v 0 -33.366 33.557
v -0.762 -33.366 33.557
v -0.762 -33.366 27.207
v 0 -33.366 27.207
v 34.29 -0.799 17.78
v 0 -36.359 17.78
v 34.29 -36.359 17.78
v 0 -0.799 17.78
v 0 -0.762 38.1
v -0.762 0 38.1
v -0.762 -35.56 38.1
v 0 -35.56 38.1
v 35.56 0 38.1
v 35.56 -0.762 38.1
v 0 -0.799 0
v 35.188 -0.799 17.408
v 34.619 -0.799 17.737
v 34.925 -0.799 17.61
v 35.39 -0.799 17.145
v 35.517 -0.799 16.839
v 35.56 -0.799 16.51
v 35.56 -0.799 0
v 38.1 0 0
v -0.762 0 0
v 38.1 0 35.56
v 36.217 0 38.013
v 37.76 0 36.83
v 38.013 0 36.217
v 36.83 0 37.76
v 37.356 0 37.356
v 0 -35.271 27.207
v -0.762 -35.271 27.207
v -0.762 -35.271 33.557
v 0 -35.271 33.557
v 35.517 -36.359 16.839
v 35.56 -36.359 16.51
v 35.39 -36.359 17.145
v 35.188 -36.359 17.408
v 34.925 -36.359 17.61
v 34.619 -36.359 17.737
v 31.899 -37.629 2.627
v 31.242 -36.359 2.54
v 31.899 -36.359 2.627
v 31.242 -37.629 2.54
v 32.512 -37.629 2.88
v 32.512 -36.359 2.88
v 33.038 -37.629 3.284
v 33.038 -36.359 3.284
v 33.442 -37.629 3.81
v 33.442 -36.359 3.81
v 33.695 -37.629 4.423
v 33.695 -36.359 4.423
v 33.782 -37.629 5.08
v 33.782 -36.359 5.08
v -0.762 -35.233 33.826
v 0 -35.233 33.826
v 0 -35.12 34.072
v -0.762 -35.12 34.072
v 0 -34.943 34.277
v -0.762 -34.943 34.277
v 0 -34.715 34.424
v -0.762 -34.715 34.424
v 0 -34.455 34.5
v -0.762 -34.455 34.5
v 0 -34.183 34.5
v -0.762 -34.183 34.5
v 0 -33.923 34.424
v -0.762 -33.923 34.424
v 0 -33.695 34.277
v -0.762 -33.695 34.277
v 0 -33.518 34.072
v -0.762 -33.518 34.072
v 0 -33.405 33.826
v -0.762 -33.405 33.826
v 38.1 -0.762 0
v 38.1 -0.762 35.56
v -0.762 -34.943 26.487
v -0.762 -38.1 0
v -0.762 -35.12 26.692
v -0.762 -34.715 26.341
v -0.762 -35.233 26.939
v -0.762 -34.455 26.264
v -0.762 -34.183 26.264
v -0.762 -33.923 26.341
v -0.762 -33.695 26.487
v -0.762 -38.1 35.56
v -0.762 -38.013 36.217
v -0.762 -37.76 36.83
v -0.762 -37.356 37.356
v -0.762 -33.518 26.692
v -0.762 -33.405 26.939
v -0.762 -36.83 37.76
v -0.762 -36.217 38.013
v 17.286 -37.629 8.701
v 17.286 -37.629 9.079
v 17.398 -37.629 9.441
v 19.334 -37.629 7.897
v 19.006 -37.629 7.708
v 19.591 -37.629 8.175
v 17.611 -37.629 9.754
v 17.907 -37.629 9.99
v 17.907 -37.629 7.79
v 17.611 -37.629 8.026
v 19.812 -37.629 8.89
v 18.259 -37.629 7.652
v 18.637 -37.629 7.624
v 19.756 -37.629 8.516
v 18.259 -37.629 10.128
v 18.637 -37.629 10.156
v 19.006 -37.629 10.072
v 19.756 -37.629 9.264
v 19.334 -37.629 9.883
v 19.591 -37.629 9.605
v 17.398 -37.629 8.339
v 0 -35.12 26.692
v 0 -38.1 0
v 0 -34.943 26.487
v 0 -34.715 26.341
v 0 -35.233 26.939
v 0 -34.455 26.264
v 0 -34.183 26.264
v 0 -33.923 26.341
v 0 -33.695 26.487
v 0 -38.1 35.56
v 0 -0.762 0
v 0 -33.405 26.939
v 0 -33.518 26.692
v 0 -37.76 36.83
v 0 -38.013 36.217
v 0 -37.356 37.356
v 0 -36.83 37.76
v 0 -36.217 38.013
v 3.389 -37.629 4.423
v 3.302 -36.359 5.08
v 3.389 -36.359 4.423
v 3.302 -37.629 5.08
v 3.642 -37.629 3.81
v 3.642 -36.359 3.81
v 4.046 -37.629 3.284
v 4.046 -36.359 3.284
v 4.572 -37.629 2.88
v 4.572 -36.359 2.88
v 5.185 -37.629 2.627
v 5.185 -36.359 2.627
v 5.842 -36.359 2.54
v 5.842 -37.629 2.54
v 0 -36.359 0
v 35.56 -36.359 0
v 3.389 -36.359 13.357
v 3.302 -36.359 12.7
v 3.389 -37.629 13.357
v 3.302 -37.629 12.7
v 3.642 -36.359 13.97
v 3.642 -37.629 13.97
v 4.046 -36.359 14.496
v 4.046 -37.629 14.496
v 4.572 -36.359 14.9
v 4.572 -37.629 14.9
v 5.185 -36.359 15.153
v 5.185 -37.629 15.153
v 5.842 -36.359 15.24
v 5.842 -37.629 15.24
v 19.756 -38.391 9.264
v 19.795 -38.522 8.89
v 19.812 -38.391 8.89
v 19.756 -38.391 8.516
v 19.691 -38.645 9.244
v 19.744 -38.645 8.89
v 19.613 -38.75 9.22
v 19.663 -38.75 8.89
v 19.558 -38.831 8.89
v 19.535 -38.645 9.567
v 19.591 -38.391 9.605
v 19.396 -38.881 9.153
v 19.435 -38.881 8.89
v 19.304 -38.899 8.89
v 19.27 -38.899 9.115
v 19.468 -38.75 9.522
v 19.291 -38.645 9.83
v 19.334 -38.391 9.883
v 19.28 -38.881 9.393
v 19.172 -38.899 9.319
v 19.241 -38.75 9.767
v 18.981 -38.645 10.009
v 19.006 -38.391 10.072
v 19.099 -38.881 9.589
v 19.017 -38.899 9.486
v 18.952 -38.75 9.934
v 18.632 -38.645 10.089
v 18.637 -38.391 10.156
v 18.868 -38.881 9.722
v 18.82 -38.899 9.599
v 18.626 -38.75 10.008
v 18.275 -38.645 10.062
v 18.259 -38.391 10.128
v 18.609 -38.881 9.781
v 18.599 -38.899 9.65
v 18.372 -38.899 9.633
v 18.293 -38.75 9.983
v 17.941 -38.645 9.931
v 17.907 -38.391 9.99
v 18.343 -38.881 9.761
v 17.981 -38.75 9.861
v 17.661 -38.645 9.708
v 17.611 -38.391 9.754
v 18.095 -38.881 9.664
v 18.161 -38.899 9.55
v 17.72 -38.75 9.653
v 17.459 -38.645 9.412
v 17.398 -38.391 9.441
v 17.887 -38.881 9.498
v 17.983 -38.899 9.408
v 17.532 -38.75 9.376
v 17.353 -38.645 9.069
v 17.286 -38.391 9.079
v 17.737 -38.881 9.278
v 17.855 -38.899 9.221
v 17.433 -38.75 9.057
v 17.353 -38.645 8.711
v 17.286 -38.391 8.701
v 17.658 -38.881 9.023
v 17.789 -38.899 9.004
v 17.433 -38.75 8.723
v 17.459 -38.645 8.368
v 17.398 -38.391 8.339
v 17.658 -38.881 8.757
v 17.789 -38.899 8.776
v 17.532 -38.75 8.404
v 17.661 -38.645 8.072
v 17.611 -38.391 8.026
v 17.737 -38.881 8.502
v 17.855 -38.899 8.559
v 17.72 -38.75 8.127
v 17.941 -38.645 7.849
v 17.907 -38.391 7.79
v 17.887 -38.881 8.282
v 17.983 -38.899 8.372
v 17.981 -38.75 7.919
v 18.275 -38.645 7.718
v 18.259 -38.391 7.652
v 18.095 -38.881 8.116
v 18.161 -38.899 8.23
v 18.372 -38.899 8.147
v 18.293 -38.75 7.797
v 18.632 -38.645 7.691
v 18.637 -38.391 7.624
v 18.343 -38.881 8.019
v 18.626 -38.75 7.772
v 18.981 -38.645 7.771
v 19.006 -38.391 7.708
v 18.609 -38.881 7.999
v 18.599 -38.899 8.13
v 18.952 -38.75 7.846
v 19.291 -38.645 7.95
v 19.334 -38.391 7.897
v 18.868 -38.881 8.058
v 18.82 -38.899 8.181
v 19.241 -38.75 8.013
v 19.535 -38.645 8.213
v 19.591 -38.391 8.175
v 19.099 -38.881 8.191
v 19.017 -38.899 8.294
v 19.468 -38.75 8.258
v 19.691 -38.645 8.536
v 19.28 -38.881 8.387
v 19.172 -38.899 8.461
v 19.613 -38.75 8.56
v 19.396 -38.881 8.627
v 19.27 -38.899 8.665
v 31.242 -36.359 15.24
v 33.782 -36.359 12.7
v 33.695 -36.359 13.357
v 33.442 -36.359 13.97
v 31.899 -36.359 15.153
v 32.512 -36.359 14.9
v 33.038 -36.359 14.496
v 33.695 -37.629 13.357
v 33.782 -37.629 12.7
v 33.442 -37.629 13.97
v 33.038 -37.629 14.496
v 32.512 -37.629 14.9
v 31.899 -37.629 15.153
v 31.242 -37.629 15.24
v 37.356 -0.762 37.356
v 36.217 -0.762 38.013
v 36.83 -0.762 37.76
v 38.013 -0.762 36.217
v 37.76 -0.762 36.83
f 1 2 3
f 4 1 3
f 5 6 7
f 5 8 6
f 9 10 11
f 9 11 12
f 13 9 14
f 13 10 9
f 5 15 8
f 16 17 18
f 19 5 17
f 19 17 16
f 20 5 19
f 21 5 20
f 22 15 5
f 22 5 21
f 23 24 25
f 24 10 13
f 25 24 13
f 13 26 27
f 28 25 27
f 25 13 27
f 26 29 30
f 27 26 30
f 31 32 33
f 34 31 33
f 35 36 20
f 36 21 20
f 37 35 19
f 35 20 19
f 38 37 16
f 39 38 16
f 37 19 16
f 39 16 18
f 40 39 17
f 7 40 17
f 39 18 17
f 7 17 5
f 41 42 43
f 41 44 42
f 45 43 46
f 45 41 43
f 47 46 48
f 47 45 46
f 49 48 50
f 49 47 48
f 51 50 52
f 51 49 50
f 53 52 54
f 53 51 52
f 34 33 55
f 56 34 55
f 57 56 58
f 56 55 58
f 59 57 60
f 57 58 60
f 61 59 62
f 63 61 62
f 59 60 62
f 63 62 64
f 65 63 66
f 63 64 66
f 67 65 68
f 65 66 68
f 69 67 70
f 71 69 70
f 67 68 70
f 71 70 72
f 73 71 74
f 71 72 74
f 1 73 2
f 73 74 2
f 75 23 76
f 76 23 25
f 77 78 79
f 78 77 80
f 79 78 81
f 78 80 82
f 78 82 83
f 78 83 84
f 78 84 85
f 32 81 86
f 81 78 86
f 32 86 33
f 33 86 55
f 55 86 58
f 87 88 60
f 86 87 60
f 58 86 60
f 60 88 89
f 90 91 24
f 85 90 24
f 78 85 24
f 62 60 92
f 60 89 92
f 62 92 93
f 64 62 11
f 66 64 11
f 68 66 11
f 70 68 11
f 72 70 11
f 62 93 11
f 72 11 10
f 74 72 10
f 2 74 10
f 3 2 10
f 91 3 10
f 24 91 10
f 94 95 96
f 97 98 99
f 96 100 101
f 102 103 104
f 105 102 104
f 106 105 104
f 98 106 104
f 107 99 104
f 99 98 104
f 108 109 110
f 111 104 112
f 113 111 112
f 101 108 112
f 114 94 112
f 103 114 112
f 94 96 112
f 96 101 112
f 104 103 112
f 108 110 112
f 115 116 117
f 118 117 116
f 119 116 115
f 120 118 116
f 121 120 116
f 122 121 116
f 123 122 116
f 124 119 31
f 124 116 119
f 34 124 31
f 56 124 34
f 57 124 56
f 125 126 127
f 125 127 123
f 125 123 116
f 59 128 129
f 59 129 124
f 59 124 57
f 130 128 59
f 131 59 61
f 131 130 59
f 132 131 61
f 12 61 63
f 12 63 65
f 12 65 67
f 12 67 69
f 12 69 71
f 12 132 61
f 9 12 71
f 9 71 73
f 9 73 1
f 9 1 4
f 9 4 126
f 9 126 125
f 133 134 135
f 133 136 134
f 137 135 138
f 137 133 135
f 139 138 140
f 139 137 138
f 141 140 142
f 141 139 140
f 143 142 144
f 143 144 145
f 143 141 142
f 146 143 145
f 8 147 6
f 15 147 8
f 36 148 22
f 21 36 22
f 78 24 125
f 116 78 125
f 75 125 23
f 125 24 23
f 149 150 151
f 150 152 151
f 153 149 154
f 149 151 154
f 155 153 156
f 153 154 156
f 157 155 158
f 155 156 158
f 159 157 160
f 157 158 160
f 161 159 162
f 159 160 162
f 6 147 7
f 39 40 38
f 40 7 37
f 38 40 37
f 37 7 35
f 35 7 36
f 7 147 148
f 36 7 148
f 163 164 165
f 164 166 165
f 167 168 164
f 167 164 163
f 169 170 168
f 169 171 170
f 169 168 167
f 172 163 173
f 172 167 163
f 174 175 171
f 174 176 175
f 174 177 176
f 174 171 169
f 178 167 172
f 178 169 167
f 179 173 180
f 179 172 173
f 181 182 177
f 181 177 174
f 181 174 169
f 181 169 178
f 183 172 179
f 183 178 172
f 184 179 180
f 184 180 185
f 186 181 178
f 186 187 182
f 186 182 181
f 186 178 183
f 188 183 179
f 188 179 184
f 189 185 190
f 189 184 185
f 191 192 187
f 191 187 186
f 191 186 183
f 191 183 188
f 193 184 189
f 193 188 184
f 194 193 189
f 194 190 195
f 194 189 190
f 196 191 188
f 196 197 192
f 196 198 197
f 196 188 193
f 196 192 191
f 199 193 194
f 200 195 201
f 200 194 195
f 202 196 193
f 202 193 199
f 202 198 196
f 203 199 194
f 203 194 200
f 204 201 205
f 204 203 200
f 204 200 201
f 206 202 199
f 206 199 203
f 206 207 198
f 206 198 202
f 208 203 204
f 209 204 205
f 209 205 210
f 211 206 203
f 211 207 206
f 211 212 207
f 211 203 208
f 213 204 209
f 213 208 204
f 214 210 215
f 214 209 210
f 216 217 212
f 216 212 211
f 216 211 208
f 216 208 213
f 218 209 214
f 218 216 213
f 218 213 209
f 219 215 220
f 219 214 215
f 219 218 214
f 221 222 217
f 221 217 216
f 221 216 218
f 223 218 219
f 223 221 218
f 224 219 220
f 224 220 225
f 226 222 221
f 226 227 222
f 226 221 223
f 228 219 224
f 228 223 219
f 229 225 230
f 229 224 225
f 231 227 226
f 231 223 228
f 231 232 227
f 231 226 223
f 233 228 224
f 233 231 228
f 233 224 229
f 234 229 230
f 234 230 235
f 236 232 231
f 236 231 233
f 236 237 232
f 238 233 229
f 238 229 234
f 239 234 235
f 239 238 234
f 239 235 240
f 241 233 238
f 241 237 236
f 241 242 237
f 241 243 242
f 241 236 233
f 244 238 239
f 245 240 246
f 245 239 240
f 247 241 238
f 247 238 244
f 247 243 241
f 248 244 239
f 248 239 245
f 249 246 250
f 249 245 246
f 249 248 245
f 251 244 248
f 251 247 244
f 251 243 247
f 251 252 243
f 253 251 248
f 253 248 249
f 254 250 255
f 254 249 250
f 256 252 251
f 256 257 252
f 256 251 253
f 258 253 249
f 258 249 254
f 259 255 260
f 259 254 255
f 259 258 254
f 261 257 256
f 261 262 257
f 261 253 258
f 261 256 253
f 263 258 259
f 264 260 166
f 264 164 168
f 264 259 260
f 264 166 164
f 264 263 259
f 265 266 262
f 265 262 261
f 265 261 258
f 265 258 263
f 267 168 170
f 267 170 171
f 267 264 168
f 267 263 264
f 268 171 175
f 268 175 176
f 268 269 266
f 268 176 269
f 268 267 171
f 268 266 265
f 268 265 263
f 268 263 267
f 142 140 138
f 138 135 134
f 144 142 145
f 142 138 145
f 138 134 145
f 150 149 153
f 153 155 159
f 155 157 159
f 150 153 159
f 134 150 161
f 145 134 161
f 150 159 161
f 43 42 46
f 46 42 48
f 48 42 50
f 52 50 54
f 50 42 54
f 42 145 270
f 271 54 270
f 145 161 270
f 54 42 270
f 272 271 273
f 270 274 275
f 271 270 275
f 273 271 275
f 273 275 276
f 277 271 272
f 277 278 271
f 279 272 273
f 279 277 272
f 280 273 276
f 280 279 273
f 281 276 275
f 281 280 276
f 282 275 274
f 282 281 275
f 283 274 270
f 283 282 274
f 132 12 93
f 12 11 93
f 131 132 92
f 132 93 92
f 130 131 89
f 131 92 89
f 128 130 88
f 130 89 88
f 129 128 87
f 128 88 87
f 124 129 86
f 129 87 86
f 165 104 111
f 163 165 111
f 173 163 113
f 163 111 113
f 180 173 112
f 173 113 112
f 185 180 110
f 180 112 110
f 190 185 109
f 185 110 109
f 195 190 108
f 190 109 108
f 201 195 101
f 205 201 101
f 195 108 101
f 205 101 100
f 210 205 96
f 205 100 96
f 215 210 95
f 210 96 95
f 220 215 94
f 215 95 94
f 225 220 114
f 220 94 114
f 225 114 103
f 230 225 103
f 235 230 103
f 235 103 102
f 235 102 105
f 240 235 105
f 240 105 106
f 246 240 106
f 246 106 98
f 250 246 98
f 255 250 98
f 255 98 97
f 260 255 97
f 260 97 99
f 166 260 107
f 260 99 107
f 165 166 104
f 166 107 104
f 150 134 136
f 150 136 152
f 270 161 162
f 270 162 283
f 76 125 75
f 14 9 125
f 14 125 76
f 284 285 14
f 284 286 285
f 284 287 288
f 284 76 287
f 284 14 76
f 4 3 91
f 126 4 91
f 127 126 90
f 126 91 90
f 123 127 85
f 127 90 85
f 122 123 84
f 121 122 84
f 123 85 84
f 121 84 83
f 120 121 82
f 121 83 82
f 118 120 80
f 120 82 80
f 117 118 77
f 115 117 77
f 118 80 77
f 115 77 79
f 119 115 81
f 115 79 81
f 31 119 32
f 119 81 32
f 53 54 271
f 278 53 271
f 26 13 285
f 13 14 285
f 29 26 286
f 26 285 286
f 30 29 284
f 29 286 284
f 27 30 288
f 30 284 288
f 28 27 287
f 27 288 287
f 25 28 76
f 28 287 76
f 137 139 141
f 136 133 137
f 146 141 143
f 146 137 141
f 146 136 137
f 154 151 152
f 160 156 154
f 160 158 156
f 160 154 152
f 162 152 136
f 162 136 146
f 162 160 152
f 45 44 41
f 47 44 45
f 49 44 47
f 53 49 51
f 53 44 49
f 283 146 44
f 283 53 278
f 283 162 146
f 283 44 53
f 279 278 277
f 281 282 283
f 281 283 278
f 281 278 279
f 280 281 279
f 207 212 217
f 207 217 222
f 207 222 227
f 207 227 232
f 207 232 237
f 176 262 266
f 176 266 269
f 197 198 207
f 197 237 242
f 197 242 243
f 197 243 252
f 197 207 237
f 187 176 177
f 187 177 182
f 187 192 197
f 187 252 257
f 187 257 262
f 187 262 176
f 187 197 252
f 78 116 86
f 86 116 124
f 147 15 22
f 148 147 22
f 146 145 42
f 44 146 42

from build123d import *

# Parameters (mm, degrees)
F0_W      = 38.1
F0_H      = 38.1
F2_DEPTH  = 0.762
F1_W      = 38.1
F1_H      = 38.1
F3_DEPTH  = 0.762
F4_W      = 35.56
F4_H      = 35.56
F5_DEPTH  = 17.78
F6_W      = 30.48
F6_H      = 12.7
F7_DEPTH  = 1.27
F8_R      = 1.27
F9_DEPTH  = 1.27
F10_R     = 2.54
F11_R     = 1.27
F13_DEPTH = 25.4
F14_R     = 0.508
F15_R     = 2.54
F16_R     = 2.54


with BuildPart() as f2:
    # F0 (on Right) → F2 (new body)
    with BuildSketch(Plane.YZ):
        with Locations((-19.05, 19.05)):
            Rectangle(F0_W, F0_H)
    extrude(amount=-F2_DEPTH)

    # F1 (on Front) → F3 (join)
    with BuildSketch(Plane.XZ):
        with Locations((19.05, 19.05)):
            Rectangle(F1_W, F1_H)
    extrude(amount=F3_DEPTH)

    # F10
    f10_edges = [f2.edges().sort_by_distance(p)[0] for p in [
        (-0.381, -38.1, 38.1),
    ]]
    fillet(f10_edges, radius=F10_R)

    # F12 (on face) → F13 (cut)
    with BuildSketch(Plane(origin=(-0.762, 0, 0), x_dir=(0, -1, 0), z_dir=(-1, 0, 0))):
        with BuildLine():
            ThreePointArc((35.2714537645, 33.5571871057), (34.3189537645, 34.5096871057), (33.3664537645, 33.5571871057))
            Line((33.3664537645, 33.5571871057), (33.3664537645, 27.2071871057))
            ThreePointArc((33.3664537645, 27.2071871057), (34.3189537645, 26.2546871057), (35.2714537645, 27.2071871057))
            Line((35.2714537645, 27.2071871057), (35.2714537645, 33.5571871057))
        make_face()
    extrude(amount=-F13_DEPTH, mode=Mode.SUBTRACT)

    # F16
    f16_edges = [f2.edges().sort_by_distance(p)[0] for p in [
        (38.1, -0.381, 38.1),
    ]]
    fillet(f16_edges, radius=F16_R)


with BuildPart() as f5:
    # F4 (on Top) → F5 (new body)
    with BuildSketch(Plane.XY):
        with Locations((17.78, -18.5785688174)):
            Rectangle(F4_W, F4_H)
    extrude(amount=F5_DEPTH)

    # F11
    f11_edges = [f5.edges().sort_by_distance(p)[0] for p in [
        (35.56, -18.578569, 17.78),
    ]]
    fillet(f11_edges, radius=F11_R)


with BuildPart() as f7:
    # F6 (on face) → F7 (new body)
    with BuildSketch(Plane.XZ.offset(36.3585688174)):
        with Locations((18.542, 8.89)):
            Rectangle(F6_W, F6_H)
    extrude(amount=F7_DEPTH)

    # F15
    f15_edges = [f7.edges().sort_by_distance(p)[0] for p in [
        (3.302, -36.993569, 15.24),
        (3.302, -36.993569, 2.54),
        (33.782, -36.993569, 2.54),
        (33.782, -36.993569, 15.24),
    ]]
    fillet(f15_edges, radius=F15_R)


with BuildPart() as f9:
    # F8 (on face) → F9 (new body)
    with BuildSketch(Plane.XZ.offset(37.6285688174)):
        with Locations((18.542, 8.89)):
            Circle(F8_R)
    extrude(amount=F9_DEPTH)

    # F14
    f14_edges = [f9.edges().sort_by_distance(p)[0] for p in [
        (17.272, -38.898569, 8.89),
    ]]
    fillet(f14_edges, radius=F14_R)


solid = Compound([f2.part, f5.part, f7.part, f9.part])
